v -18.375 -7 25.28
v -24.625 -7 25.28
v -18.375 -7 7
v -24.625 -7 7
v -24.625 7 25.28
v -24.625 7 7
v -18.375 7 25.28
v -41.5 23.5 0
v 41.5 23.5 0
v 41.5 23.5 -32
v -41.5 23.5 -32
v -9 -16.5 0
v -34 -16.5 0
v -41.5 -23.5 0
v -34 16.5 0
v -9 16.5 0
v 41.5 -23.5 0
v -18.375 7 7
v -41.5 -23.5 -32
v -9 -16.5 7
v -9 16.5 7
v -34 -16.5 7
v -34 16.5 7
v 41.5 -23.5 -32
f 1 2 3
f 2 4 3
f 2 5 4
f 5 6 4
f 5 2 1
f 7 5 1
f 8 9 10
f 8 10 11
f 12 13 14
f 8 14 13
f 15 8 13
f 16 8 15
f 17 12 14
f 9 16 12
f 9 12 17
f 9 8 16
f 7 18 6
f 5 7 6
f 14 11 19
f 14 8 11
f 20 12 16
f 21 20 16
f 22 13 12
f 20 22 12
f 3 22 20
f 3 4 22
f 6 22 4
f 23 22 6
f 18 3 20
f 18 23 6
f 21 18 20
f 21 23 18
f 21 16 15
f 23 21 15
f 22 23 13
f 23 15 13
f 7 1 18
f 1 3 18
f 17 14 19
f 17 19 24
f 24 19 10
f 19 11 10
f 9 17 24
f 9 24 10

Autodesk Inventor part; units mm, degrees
ref_plane "YZ Plane" through (0, 0, 0) normal (1, 0, 0) x (0, 1, 0)
ref_plane "XZ Plane" through (0, 0, 0) normal (0, 1, 0) x (-1, 0, 0)
ref_plane "XY Plane" through (0, 0, 0) normal (0, 0, 1) x (1, 0, 0)
sketch "Sketch8" plane through (0, 0, 0) normal (0, 0, 1) x (1, 0, 0)
  line L0 (-41.5, -23.5) -> (41.5, -23.5)
  line L1 (41.5, -23.5) -> (41.5, 23.5)
  line L2 (41.5, 23.5) -> (-41.5, 23.5)
  line L3 (-41.5, 23.5) -> (-41.5, -23.5)
  line L4 (-41.5, -23.5) -> (41.5, 23.5) construction
  line L5 (41.5, -23.5) -> (-41.5, 23.5) construction
  point P0 (0, 0)
  dimension "d31" = 47
  dimension "d32" = 83
extrude "Extrusion6" add sketch "Sketch8" against normal blind 32
sketch "Sketch9" plane through (0, 0, 0) normal (0, 0, 1) x (1, 0, 0)
  line L0 (-41.5, -23.5) -> (-41.5, 23.5) construction
  line L1 (-41.5, 0) -> (41.5, 0) construction
  line L2 (41.5, 23.5) -> (41.5, -23.5) construction
  line L3 (-34, -16.5) -> (-9, -16.5)
  line L4 (-9, -16.5) -> (-9, 16.5)
  line L5 (-9, 16.5) -> (-34, 16.5)
  line L6 (-34, 16.5) -> (-34, -16.5)
  line L7 (-34, -16.5) -> (-9, 16.5) construction
  line L8 (-9, -16.5) -> (-34, 16.5) construction
  point P0 (0, 0)
  point P1 (-21.5, 0)
  point P2 (-21.5, 0)
  dimension "d35" = 20
  dimension "d36" = 25
  dimension "d37" = 33
extrude "Extrusion7" add sketch "Sketch9" along normal blind 7
sketch "Sketch10" plane through (0, 0, 7) normal (0, 0, 1) x (1, 0, 0)
  line L0 (-34, -16.5) -> (-34, 16.5) construction
  line L1 (-34, 0) -> (-9, 0) construction
  line L2 (-9, 16.5) -> (-9, -16.5) construction
  line L3 (-24.625, -7) -> (-18.375, -7)
  line L4 (-18.375, -7) -> (-18.375, 7)
  line L5 (-18.375, 7) -> (-24.625, 7)
  line L6 (-24.625, 7) -> (-24.625, -7)
  line L7 (-24.625, -7) -> (-18.375, 7) construction
  line L8 (-18.375, -7) -> (-24.625, 7) construction
  line L9 (-41.5, 23.5) -> (-41.5, -23.5) projected
  point P0 (0, 0)
  point P1 (-21.5, 0)
  point P2 (-21.5, 0)
  dimension "d40" = 20
  dimension "d41" = 14
  dimension "d42" = 6.25
extrude "Extrusion8" add sketch "Sketch10" along normal blind 18.28
equation "\"d31\" = poeWidth"
equation "\"d32\" = poeLength"
equation "\"d33\" = poeMajorDepth"
equation "\"d35\" = plugBaseCenterFromTop"
equation "\"d36\" = plugBaseLength"
equation "\"d37\" = plugBaseWidth"
equation "\"d38\" = plugBaseDepth"
equation "\"d40\" = plugCenterFromTop"
equation "\"d41\" = plugWidth"
equation "\"d42\" = plugLength"
equation "\"d43\" = plugDepth"
equation "\"poeLength\" = 83"
equation "\"poeWidth\" = 47"
equation "\"poeMajorDepth\" = 32"
equation "\"plugBaseWidth\" = 33"
equation "\"plugBaseLength\" = 25"
equation "\"plugBaseDepth\" = 7"
equation "\"plugBaseCenterFromTop\" = 20"
equation "\"plugWidth\" = 14"
equation "\"plugLength\" = 6.25"
equation "\"plugDepth\" = 18.28"
equation "\"plugCenterFromTop\" = 20"
properties part number "poeAdapter" material "PC/ABS Plastic"
